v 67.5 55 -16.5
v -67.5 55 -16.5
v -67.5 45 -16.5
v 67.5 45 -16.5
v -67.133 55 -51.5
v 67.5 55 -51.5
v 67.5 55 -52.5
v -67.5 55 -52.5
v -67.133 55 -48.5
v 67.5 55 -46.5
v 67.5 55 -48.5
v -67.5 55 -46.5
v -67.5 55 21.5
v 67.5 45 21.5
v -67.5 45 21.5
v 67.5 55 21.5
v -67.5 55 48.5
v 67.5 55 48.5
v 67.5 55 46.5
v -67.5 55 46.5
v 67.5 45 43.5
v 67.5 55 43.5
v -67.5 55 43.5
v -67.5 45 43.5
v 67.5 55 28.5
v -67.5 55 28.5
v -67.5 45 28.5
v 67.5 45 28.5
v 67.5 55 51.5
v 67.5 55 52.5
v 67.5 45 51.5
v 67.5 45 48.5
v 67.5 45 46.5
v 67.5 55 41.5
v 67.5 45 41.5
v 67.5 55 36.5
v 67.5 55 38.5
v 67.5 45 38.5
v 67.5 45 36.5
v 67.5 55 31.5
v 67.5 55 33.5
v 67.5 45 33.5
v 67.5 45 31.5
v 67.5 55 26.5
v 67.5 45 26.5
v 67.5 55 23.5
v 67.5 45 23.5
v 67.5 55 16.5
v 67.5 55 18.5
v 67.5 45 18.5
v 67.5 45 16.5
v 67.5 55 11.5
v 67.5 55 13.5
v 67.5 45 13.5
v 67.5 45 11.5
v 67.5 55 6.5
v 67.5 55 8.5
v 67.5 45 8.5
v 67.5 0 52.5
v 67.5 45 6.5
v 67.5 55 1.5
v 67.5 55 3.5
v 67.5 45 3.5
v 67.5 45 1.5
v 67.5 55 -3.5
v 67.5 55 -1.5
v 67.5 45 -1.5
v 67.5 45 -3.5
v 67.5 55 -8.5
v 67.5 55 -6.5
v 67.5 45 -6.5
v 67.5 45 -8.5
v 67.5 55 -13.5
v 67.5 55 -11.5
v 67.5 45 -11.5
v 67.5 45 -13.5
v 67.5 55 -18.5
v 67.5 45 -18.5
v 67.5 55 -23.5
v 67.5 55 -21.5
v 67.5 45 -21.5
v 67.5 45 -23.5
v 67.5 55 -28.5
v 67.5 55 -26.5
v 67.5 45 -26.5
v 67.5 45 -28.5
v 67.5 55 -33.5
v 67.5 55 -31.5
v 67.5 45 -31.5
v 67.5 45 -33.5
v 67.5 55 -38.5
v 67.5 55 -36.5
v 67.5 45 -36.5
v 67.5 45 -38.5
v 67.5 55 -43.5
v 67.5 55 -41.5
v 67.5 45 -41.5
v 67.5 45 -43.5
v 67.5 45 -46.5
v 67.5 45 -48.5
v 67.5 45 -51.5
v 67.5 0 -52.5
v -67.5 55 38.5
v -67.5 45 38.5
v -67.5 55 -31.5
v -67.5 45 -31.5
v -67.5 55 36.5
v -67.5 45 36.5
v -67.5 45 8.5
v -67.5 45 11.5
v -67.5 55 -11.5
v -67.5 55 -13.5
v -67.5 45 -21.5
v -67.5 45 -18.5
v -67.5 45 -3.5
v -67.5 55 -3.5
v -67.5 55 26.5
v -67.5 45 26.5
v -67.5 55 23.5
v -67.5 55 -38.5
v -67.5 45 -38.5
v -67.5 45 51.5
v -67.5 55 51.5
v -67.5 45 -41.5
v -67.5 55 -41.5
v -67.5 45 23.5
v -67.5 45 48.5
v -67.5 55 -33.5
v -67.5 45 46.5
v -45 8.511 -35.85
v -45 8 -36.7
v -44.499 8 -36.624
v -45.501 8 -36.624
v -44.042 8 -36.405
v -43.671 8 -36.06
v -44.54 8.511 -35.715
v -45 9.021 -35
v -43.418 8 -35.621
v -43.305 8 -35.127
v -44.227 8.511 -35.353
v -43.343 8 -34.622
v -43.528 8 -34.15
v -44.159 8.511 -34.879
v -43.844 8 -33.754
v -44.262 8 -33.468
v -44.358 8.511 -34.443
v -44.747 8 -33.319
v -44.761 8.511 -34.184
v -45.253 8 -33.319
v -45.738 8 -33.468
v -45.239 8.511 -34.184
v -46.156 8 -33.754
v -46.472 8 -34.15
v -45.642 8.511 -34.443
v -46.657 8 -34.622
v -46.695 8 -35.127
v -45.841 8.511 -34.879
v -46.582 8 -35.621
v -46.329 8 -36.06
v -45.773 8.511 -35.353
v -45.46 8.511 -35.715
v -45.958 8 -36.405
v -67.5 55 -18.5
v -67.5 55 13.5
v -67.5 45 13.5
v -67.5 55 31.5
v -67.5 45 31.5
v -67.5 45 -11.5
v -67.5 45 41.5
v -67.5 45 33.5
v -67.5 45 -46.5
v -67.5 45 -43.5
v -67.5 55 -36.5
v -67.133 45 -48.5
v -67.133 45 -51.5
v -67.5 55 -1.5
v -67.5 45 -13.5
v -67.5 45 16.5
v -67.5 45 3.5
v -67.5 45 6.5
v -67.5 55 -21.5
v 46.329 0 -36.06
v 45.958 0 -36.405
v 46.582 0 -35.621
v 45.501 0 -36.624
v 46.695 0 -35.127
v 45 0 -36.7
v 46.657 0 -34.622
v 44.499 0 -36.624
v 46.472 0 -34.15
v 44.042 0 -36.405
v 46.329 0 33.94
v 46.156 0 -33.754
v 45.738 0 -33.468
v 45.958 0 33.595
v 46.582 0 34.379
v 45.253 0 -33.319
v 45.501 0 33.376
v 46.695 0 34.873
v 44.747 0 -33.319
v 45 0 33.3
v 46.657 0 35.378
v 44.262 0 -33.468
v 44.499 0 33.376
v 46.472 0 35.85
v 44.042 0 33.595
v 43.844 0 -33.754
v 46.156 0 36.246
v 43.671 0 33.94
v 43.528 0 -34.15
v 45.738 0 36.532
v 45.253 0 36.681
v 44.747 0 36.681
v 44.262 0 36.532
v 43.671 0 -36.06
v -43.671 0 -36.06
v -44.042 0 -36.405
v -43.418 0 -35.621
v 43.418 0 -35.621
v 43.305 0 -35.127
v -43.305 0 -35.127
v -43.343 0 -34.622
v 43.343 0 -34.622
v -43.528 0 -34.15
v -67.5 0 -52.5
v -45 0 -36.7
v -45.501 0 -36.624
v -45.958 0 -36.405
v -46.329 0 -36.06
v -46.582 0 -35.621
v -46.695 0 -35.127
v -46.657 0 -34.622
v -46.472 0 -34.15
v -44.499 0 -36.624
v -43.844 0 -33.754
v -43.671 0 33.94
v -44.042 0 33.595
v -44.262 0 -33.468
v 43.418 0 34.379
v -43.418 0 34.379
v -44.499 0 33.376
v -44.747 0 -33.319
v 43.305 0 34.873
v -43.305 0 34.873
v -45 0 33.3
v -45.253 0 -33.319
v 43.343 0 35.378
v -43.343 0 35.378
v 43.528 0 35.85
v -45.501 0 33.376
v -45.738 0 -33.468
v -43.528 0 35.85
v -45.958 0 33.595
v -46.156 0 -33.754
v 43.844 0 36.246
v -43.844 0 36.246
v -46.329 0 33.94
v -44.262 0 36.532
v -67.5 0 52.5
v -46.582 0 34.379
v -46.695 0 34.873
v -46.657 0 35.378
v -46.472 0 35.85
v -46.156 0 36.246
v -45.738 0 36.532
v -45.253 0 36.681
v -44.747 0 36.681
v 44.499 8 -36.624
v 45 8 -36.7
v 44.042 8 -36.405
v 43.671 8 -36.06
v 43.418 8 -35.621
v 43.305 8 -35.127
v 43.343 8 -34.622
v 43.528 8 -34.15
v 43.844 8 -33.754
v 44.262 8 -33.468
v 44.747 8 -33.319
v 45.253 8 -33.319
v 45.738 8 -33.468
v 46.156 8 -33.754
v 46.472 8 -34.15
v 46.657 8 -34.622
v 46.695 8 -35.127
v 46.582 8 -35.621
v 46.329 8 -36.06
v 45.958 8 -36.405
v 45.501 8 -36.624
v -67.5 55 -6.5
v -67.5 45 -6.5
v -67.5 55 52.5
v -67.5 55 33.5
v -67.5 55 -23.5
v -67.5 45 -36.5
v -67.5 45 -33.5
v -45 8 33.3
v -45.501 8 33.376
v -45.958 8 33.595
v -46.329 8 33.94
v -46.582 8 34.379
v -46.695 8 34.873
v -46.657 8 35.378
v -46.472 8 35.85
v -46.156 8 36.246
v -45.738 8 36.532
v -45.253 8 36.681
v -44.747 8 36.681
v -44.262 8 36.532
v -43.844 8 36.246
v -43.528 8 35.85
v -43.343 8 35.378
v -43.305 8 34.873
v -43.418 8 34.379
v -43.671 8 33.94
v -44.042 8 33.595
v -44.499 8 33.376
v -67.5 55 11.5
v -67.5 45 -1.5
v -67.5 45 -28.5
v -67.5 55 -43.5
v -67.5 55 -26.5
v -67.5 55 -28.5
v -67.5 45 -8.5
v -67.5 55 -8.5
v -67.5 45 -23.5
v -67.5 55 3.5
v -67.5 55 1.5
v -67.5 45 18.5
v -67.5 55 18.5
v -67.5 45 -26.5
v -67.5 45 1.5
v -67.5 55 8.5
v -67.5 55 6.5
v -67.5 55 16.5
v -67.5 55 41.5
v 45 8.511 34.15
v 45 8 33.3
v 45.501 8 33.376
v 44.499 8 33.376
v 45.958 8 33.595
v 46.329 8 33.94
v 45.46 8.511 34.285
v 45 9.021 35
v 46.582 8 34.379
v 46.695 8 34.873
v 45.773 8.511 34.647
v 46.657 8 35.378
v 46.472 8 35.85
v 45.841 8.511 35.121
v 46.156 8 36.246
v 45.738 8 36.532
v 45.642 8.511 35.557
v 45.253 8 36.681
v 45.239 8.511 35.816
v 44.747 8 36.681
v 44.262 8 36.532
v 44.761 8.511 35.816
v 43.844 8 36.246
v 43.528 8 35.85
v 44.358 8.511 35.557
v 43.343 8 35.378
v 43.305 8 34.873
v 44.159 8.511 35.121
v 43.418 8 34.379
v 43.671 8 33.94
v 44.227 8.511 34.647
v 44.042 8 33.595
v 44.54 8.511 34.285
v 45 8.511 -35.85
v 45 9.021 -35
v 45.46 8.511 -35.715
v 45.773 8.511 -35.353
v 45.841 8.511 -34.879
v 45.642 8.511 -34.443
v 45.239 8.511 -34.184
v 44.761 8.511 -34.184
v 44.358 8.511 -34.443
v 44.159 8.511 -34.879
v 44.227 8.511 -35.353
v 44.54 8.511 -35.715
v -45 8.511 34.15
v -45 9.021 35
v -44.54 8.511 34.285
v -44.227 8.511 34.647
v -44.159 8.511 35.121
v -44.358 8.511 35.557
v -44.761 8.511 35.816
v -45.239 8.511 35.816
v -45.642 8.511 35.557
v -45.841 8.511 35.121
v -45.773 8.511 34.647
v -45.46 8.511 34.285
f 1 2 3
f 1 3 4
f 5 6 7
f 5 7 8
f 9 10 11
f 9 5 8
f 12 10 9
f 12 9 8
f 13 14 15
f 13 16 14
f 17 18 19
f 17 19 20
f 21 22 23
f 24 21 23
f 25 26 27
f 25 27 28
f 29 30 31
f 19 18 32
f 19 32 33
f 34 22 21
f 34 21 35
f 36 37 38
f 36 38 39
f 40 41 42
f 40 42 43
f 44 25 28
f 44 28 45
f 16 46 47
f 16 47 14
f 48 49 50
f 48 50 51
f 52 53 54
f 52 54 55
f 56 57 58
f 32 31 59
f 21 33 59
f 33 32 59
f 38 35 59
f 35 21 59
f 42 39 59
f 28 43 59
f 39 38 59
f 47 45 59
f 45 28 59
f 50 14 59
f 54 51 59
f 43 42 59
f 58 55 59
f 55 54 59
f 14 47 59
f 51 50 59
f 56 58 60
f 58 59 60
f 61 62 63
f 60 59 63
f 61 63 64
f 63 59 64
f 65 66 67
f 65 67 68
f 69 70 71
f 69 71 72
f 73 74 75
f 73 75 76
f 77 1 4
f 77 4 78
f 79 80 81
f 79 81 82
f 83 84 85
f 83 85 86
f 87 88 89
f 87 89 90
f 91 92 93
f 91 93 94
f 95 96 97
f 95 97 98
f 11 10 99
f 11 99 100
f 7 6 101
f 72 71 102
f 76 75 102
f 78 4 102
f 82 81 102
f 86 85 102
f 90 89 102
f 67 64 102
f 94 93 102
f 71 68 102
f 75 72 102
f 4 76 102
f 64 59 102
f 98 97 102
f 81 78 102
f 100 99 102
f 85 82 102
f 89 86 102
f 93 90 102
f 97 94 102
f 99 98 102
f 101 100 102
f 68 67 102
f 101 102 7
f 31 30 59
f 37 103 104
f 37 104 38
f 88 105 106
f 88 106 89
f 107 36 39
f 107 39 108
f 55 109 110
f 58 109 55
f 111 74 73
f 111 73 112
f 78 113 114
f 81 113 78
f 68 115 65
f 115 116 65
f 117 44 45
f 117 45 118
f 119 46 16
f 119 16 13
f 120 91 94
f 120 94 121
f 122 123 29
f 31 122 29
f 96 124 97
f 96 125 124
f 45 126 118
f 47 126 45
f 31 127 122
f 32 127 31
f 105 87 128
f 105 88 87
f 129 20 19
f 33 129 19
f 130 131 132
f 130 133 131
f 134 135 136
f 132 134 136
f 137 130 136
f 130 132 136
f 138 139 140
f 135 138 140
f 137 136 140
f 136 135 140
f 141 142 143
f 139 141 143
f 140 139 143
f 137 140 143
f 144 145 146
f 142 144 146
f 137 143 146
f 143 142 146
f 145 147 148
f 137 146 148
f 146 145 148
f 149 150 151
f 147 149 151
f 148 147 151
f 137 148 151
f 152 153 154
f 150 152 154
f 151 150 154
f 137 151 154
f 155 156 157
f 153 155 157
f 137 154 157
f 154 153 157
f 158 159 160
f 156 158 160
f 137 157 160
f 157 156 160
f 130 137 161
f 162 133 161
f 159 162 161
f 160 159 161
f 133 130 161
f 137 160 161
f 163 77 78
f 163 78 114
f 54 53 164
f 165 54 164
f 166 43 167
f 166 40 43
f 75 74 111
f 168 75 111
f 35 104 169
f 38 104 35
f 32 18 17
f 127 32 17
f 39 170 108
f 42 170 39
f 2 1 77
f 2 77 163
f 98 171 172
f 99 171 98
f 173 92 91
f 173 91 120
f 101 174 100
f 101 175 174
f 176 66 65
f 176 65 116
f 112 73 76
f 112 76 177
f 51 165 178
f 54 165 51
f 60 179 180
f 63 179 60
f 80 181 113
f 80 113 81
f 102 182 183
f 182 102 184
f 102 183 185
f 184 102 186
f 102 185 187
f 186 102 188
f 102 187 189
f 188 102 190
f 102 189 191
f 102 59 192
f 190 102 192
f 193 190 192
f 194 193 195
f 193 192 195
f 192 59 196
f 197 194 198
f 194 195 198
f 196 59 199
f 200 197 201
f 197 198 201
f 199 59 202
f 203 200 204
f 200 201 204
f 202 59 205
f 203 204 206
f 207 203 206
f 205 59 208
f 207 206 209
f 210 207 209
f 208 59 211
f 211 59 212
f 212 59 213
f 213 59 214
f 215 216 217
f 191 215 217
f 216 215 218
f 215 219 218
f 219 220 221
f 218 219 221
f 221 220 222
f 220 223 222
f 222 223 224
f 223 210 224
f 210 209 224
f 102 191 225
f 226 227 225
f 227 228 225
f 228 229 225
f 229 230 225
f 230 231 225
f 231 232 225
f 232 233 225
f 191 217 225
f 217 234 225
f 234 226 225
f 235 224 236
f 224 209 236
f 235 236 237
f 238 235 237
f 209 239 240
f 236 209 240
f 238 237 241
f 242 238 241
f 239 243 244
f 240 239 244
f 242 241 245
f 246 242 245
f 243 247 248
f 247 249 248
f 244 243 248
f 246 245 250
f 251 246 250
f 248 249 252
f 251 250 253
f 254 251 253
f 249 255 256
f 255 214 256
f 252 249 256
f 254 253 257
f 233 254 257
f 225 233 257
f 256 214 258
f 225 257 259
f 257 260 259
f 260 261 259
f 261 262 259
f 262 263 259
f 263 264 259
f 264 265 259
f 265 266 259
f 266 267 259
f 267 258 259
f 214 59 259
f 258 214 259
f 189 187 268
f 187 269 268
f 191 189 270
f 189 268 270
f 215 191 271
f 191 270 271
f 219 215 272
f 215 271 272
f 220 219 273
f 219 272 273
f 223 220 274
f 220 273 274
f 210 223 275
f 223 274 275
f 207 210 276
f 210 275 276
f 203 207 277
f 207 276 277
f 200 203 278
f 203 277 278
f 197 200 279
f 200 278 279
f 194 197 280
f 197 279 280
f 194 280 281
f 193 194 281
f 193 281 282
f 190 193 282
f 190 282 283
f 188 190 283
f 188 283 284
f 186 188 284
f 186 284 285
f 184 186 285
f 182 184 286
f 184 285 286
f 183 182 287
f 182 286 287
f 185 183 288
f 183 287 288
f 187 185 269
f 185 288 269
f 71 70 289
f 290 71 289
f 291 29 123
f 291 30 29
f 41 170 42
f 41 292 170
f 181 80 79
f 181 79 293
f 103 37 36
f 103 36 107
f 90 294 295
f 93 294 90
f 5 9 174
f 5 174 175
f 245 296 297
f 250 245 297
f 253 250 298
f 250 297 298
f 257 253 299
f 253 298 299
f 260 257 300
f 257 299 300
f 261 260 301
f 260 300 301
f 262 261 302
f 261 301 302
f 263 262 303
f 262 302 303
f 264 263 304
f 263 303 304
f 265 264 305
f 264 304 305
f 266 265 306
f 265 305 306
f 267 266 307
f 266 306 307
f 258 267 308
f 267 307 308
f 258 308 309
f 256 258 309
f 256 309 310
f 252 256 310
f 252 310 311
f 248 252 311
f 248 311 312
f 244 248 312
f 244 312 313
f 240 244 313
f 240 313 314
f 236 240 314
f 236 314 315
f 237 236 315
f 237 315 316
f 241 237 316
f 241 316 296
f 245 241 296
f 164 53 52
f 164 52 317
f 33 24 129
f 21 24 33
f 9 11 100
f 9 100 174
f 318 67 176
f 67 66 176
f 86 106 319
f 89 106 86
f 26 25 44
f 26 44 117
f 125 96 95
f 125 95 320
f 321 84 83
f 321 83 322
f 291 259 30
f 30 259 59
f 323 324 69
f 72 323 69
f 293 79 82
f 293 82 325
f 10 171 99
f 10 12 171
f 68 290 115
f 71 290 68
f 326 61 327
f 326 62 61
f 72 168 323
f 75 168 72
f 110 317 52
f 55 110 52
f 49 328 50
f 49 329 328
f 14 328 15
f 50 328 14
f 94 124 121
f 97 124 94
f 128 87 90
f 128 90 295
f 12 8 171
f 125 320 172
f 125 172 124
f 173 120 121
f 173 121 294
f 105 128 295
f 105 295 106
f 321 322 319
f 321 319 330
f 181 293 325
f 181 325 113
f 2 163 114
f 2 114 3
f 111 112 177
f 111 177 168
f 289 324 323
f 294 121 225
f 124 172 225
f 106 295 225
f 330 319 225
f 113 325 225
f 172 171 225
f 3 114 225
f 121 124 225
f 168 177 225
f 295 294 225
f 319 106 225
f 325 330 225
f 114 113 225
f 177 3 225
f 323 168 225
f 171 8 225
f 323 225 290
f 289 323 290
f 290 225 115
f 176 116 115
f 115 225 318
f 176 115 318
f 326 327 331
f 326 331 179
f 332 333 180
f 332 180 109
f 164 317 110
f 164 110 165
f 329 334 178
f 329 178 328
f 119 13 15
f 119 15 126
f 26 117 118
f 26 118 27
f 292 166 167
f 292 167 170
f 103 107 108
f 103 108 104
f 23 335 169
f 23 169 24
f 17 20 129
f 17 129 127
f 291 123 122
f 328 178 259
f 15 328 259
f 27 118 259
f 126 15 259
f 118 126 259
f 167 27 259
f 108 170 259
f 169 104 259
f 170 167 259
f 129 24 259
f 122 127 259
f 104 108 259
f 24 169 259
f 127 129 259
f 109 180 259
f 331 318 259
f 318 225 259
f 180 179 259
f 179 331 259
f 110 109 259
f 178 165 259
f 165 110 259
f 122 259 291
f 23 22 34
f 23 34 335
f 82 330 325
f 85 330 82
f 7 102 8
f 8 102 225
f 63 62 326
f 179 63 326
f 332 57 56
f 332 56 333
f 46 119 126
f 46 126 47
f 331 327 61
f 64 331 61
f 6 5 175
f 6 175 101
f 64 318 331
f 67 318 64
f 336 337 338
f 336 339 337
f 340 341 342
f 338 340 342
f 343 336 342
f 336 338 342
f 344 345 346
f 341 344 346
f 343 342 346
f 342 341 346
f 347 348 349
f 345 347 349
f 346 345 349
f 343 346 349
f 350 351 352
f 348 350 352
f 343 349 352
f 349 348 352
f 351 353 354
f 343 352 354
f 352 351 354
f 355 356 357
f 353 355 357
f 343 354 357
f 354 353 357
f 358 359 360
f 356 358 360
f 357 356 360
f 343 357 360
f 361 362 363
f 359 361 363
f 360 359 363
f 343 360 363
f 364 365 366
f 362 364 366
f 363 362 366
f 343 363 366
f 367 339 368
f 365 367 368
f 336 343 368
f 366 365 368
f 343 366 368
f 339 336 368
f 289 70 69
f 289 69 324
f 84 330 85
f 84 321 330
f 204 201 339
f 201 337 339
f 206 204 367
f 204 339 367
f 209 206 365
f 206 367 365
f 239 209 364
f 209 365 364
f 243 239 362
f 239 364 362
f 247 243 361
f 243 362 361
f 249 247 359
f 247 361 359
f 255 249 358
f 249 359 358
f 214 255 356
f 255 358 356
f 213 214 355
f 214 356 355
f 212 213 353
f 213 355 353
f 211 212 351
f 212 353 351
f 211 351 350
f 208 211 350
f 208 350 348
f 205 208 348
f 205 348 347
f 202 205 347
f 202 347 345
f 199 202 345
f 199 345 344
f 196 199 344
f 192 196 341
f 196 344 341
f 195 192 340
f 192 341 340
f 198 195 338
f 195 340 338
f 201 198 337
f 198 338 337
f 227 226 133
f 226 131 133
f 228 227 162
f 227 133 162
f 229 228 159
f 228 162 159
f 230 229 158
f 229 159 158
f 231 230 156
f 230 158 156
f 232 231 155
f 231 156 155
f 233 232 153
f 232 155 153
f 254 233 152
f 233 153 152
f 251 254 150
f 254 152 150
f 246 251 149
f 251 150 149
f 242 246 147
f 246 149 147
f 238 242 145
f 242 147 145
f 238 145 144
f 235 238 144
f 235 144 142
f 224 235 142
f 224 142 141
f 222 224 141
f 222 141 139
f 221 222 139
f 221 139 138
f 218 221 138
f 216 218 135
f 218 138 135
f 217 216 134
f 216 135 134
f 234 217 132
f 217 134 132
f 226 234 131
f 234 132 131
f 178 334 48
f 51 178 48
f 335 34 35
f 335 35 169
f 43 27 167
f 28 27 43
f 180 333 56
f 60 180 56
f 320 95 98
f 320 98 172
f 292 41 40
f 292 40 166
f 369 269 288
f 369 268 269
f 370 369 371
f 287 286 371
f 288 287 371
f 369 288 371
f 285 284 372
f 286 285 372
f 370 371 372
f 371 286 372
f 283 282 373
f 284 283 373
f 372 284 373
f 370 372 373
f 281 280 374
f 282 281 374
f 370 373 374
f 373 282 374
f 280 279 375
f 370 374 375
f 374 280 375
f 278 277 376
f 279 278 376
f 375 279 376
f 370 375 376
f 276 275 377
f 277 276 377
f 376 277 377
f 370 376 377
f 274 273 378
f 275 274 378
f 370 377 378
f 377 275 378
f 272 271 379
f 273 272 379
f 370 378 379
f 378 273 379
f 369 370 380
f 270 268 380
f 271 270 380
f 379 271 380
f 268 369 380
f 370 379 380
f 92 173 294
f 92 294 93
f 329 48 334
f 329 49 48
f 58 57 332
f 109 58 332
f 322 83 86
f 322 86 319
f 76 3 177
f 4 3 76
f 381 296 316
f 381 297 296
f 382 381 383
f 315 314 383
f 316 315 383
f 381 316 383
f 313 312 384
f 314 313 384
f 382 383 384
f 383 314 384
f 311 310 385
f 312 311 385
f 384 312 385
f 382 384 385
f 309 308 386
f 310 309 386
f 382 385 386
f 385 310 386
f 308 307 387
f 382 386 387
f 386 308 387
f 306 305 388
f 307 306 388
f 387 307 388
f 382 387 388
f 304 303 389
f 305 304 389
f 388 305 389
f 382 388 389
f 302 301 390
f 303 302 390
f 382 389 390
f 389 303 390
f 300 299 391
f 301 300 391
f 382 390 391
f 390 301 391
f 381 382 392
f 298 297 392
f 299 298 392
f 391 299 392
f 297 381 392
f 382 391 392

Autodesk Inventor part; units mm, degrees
ref_plane "YZ Plane" through (0, 0, 0) normal (1, 0, 0) x (0, 1, 0)
ref_plane "XZ Plane" through (0, 0, 0) normal (0, 1, 0) x (-1, 0, 0)
ref_plane "XY Plane" through (0, 0, 0) normal (0, 0, 1) x (1, 0, 0)
sketch "Sketch1" plane through (0, 0, 0) normal (0, 1, 0) x (-1, 0, 0)
  line L0 (67.5, 52.5) -> (-67.5, 52.5)
  line L1 (-67.5, 52.5) -> (-67.5, -52.5)
  line L2 (-67.5, -52.5) -> (67.5, -52.5)
  line L3 (67.5, -52.5) -> (67.5, 52.5)
  line L4 (67.5, 52.5) -> (-67.5, -52.5) construction
  line L5 (-67.5, 52.5) -> (67.5, -52.5) construction
  point P0 (0, 0)
  dimension "d0" = 135
  dimension "d1" = 105
extrude "Extrusion1" add sketch "Sketch1" along normal blind 55
sketch "Sketch2" plane through (0, 55, 0) normal (0, 1, 0) x (1, 0, 0)
  line L0 (67.5, -52.5) -> (67.5, 52.5) projected
  line L1 (-67.5, -1.5) -> (67.5, -1.5)
  line L2 (67.5, -1.5) -> (67.5, 1.5)
  line L3 (67.5, 1.5) -> (-67.5, 1.5)
  line L4 (-67.5, 1.5) -> (-67.5, -1.5)
  line L5 (-67.5, -1.5) -> (67.5, 1.5) construction
  line L6 (67.5, -1.5) -> (-67.5, 1.5) construction
  line L7 (-67.5, 3.5) -> (67.5, 3.5)
  line L8 (67.5, 3.5) -> (67.5, 6.5)
  line L9 (67.5, 6.5) -> (-67.5, 6.5)
  line L10 (-67.5, 6.5) -> (-67.5, 3.5)
  line L11 (-67.5, 3.5) -> (67.5, 6.5) construction
  line L12 (67.5, 3.5) -> (-67.5, 6.5) construction
  line L13 (67.5, -3.5) -> (-67.5, -3.5)
  line L14 (-67.5, -3.5) -> (-67.5, -6.5)
  line L15 (-67.5, -6.5) -> (67.5, -6.5)
  line L16 (67.5, -6.5) -> (67.5, -3.5)
  line L17 (67.5, -8.5) -> (-67.5, -8.5)
  line L18 (-67.5, -8.5) -> (-67.5, -11.5)
  line L19 (-67.5, -11.5) -> (67.5, -11.5)
  line L20 (67.5, -11.5) -> (67.5, -8.5)
  line L21 (67.5, -13.5) -> (-67.5, -13.5)
  line L22 (-67.5, -13.5) -> (-67.5, -16.5)
  line L23 (-67.5, -16.5) -> (67.5, -16.5)
  line L24 (67.5, -16.5) -> (67.5, -13.5)
  line L25 (67.5, 11.5) -> (-67.5, 11.5)
  line L26 (-67.5, 11.5) -> (-67.5, 8.5)
  line L27 (-67.5, 8.5) -> (67.5, 8.5)
  line L28 (67.5, 8.5) -> (67.5, 11.5)
  line L29 (67.5, 13.5) -> (-67.5, 13.5)
  line L30 (-67.5, 13.5) -> (-67.5, 16.5)
  line L31 (-67.5, 16.5) -> (67.5, 16.5)
  line L32 (67.5, 16.5) -> (67.5, 13.5)
  line L33 (67.5, 23.5) -> (-67.5, 23.5)
  line L34 (-67.5, 23.5) -> (-67.5, 26.5)
  line L35 (-67.5, 26.5) -> (67.5, 26.5)
  line L36 (67.5, 26.5) -> (67.5, 23.5)
  line L37 (67.5, 18.5) -> (-67.5, 18.5)
  line L38 (-67.5, 18.5) -> (-67.5, 21.5)
  line L39 (-67.5, 21.5) -> (67.5, 21.5)
  line L40 (67.5, 21.5) -> (67.5, 18.5)
  line L41 (67.5, 28.5) -> (-67.5, 28.5)
  line L42 (-67.5, 28.5) -> (-67.5, 31.5)
  line L43 (-67.5, 31.5) -> (67.5, 31.5)
  line L44 (67.5, 31.5) -> (67.5, 28.5)
  line L45 (67.5, -41.5) -> (-67.5, -41.5)
  line L46 (-67.5, -41.5) -> (-67.5, -38.5)
  line L47 (-67.5, -38.5) -> (67.5, -38.5)
  line L48 (67.5, -38.5) -> (67.5, -41.5)
  line L49 (67.5, -36.5) -> (-67.5, -36.5)
  line L50 (-67.5, -36.5) -> (-67.5, -33.5)
  line L51 (-67.5, -33.5) -> (67.5, -33.5)
  line L52 (67.5, -33.5) -> (67.5, -36.5)
  line L53 (67.5, -31.5) -> (-67.5, -31.5)
  line L54 (-67.5, -31.5) -> (-67.5, -28.5)
  line L55 (-67.5, -28.5) -> (67.5, -28.5)
  line L56 (67.5, -28.5) -> (67.5, -31.5)
  line L57 (67.5, -26.5) -> (-67.5, -26.5)
  line L58 (-67.5, -26.5) -> (-67.5, -23.5)
  line L59 (-67.5, -23.5) -> (67.5, -23.5)
  line L60 (67.5, -23.5) -> (67.5, -26.5)
  line L61 (67.5, -21.5) -> (-67.5, -21.5)
  line L62 (-67.5, -21.5) -> (-67.5, -18.5)
  line L63 (-67.5, -18.5) -> (67.5, -18.5)
  line L64 (67.5, -18.5) -> (67.5, -21.5)
  line L65 (67.5, 33.5) -> (-67.5, 33.5)
  line L66 (-67.5, 33.5) -> (-67.5, 36.5)
  line L67 (-67.5, 36.5) -> (67.5, 36.5)
  line L68 (67.5, 36.5) -> (67.5, 33.5)
  line L69 (67.5, 38.5) -> (-67.5, 38.5)
  line L70 (-67.5, 38.5) -> (-67.5, 41.5)
  line L71 (-67.5, 41.5) -> (67.5, 41.5)
  line L72 (67.5, 41.5) -> (67.5, 38.5)
  line L73 (67.5, 43.5) -> (-67.5, 43.5)
  line L74 (-67.5, 43.5) -> (-67.5, 46.5)
  line L75 (-67.5, 46.5) -> (67.5, 46.5)
  line L76 (67.5, 46.5) -> (67.5, 43.5)
  line L77 (67.5, -43.5) -> (-67.5, -43.5)
  line L78 (-67.5, -43.5) -> (-67.5, -46.5)
  line L79 (-67.5, -46.5) -> (67.5, -46.5)
  line L80 (67.5, -46.5) -> (67.5, -43.5)
  line L81 (67.5, -48.5) -> (-67.5, -48.5)
  line L82 (-67.5, -48.5) -> (-67.5, -51.5)
  line L83 (-67.5, -51.5) -> (67.5, -51.5)
  line L84 (67.5, -51.5) -> (67.5, -48.5)
  line L85 (67.8672, 48.5) -> (-67.1328, 48.5)
  line L86 (-67.1328, 48.5) -> (-67.1328, 51.5)
  line L87 (-67.1328, 51.5) -> (67.8672, 51.5)
  line L88 (67.8672, 51.5) -> (67.8672, 48.5)
  point P0 (0, 0)
  point P1 (0, 5)
  dimension "d4" = 3
  dimension "d5" = 135
  dimension "d6" = 2
  dimension "d7" = 0
  dimension "d8" = 3
  dimension "d9" = 135
  dimension "d10" = 3
  dimension "d11" = 135
  dimension "d12" = 3
  dimension "d13" = 135
  dimension "d14" = 3
  dimension "d15" = 135
  dimension "d16" = 3
  dimension "d17" = 135
  dimension "d18" = 3
  dimension "d19" = 2
  dimension "d20" = 2
  dimension "d21" = 2
  dimension "d22" = 2
  dimension "d23" = 2
  dimension "d24" = 135
  dimension "d25" = 3
  dimension "d26" = 135
  dimension "d27" = 3
  dimension "d28" = 135
  dimension "d29" = 3
  dimension "d30" = 135
  dimension "d31" = 3
  dimension "d32" = 135
  dimension "d33" = 3
  dimension "d34" = 135
  dimension "d35" = 3
  dimension "d36" = 135
  dimension "d37" = 3
  dimension "d38" = 135
  dimension "d39" = 3
  dimension "d40" = 135
  dimension "d41" = 3
  dimension "d42" = 2
  dimension "d43" = 2
  dimension "d44" = 2
  dimension "d45" = 2
  dimension "d46" = 2
  dimension "d47" = 2
  dimension "d48" = 2
  dimension "d49" = 2
  dimension "d50" = 2
  dimension "d51" = 135
  dimension "d52" = 3
  dimension "d53" = 135
  dimension "d54" = 3
  dimension "d55" = 135
  dimension "d56" = 3
  dimension "d57" = 135
  dimension "d58" = 3
  dimension "d59" = 2
  dimension "d60" = 2
  dimension "d61" = 2
  dimension "d62" = 2
  dimension "d63" = 135
  dimension "d64" = 3
  dimension "d65" = 2
extrude "Extrusion2" cut sketch "Sketch2" against normal blind 10
sketch "Sketch3" plane through (0, 0, 0) normal (0, -1, 0) x (1, 0, 0)
  line L0 (45, 35) -> (-45, 35) construction
  line L1 (-45, 35) -> (-45, -35) construction
  line L2 (-45, -35) -> (45, -35) construction
  line L3 (45, -35) -> (45, 35) construction
  line L4 (45, 35) -> (-45, -35) construction
  line L5 (-45, 35) -> (45, -35) construction
  point P0 (0, 0)
  dimension "d68" = 90
  dimension "d69" = 70
hole "Hole1" at (45, 0, -35) at (-45, 0, -35) at (-45, 0, 35) at (45, 0, 35) direction (0, 1, 0) diameter 3.4 depth 8 tip angle 118
properties part number "WR-LEN-base"
